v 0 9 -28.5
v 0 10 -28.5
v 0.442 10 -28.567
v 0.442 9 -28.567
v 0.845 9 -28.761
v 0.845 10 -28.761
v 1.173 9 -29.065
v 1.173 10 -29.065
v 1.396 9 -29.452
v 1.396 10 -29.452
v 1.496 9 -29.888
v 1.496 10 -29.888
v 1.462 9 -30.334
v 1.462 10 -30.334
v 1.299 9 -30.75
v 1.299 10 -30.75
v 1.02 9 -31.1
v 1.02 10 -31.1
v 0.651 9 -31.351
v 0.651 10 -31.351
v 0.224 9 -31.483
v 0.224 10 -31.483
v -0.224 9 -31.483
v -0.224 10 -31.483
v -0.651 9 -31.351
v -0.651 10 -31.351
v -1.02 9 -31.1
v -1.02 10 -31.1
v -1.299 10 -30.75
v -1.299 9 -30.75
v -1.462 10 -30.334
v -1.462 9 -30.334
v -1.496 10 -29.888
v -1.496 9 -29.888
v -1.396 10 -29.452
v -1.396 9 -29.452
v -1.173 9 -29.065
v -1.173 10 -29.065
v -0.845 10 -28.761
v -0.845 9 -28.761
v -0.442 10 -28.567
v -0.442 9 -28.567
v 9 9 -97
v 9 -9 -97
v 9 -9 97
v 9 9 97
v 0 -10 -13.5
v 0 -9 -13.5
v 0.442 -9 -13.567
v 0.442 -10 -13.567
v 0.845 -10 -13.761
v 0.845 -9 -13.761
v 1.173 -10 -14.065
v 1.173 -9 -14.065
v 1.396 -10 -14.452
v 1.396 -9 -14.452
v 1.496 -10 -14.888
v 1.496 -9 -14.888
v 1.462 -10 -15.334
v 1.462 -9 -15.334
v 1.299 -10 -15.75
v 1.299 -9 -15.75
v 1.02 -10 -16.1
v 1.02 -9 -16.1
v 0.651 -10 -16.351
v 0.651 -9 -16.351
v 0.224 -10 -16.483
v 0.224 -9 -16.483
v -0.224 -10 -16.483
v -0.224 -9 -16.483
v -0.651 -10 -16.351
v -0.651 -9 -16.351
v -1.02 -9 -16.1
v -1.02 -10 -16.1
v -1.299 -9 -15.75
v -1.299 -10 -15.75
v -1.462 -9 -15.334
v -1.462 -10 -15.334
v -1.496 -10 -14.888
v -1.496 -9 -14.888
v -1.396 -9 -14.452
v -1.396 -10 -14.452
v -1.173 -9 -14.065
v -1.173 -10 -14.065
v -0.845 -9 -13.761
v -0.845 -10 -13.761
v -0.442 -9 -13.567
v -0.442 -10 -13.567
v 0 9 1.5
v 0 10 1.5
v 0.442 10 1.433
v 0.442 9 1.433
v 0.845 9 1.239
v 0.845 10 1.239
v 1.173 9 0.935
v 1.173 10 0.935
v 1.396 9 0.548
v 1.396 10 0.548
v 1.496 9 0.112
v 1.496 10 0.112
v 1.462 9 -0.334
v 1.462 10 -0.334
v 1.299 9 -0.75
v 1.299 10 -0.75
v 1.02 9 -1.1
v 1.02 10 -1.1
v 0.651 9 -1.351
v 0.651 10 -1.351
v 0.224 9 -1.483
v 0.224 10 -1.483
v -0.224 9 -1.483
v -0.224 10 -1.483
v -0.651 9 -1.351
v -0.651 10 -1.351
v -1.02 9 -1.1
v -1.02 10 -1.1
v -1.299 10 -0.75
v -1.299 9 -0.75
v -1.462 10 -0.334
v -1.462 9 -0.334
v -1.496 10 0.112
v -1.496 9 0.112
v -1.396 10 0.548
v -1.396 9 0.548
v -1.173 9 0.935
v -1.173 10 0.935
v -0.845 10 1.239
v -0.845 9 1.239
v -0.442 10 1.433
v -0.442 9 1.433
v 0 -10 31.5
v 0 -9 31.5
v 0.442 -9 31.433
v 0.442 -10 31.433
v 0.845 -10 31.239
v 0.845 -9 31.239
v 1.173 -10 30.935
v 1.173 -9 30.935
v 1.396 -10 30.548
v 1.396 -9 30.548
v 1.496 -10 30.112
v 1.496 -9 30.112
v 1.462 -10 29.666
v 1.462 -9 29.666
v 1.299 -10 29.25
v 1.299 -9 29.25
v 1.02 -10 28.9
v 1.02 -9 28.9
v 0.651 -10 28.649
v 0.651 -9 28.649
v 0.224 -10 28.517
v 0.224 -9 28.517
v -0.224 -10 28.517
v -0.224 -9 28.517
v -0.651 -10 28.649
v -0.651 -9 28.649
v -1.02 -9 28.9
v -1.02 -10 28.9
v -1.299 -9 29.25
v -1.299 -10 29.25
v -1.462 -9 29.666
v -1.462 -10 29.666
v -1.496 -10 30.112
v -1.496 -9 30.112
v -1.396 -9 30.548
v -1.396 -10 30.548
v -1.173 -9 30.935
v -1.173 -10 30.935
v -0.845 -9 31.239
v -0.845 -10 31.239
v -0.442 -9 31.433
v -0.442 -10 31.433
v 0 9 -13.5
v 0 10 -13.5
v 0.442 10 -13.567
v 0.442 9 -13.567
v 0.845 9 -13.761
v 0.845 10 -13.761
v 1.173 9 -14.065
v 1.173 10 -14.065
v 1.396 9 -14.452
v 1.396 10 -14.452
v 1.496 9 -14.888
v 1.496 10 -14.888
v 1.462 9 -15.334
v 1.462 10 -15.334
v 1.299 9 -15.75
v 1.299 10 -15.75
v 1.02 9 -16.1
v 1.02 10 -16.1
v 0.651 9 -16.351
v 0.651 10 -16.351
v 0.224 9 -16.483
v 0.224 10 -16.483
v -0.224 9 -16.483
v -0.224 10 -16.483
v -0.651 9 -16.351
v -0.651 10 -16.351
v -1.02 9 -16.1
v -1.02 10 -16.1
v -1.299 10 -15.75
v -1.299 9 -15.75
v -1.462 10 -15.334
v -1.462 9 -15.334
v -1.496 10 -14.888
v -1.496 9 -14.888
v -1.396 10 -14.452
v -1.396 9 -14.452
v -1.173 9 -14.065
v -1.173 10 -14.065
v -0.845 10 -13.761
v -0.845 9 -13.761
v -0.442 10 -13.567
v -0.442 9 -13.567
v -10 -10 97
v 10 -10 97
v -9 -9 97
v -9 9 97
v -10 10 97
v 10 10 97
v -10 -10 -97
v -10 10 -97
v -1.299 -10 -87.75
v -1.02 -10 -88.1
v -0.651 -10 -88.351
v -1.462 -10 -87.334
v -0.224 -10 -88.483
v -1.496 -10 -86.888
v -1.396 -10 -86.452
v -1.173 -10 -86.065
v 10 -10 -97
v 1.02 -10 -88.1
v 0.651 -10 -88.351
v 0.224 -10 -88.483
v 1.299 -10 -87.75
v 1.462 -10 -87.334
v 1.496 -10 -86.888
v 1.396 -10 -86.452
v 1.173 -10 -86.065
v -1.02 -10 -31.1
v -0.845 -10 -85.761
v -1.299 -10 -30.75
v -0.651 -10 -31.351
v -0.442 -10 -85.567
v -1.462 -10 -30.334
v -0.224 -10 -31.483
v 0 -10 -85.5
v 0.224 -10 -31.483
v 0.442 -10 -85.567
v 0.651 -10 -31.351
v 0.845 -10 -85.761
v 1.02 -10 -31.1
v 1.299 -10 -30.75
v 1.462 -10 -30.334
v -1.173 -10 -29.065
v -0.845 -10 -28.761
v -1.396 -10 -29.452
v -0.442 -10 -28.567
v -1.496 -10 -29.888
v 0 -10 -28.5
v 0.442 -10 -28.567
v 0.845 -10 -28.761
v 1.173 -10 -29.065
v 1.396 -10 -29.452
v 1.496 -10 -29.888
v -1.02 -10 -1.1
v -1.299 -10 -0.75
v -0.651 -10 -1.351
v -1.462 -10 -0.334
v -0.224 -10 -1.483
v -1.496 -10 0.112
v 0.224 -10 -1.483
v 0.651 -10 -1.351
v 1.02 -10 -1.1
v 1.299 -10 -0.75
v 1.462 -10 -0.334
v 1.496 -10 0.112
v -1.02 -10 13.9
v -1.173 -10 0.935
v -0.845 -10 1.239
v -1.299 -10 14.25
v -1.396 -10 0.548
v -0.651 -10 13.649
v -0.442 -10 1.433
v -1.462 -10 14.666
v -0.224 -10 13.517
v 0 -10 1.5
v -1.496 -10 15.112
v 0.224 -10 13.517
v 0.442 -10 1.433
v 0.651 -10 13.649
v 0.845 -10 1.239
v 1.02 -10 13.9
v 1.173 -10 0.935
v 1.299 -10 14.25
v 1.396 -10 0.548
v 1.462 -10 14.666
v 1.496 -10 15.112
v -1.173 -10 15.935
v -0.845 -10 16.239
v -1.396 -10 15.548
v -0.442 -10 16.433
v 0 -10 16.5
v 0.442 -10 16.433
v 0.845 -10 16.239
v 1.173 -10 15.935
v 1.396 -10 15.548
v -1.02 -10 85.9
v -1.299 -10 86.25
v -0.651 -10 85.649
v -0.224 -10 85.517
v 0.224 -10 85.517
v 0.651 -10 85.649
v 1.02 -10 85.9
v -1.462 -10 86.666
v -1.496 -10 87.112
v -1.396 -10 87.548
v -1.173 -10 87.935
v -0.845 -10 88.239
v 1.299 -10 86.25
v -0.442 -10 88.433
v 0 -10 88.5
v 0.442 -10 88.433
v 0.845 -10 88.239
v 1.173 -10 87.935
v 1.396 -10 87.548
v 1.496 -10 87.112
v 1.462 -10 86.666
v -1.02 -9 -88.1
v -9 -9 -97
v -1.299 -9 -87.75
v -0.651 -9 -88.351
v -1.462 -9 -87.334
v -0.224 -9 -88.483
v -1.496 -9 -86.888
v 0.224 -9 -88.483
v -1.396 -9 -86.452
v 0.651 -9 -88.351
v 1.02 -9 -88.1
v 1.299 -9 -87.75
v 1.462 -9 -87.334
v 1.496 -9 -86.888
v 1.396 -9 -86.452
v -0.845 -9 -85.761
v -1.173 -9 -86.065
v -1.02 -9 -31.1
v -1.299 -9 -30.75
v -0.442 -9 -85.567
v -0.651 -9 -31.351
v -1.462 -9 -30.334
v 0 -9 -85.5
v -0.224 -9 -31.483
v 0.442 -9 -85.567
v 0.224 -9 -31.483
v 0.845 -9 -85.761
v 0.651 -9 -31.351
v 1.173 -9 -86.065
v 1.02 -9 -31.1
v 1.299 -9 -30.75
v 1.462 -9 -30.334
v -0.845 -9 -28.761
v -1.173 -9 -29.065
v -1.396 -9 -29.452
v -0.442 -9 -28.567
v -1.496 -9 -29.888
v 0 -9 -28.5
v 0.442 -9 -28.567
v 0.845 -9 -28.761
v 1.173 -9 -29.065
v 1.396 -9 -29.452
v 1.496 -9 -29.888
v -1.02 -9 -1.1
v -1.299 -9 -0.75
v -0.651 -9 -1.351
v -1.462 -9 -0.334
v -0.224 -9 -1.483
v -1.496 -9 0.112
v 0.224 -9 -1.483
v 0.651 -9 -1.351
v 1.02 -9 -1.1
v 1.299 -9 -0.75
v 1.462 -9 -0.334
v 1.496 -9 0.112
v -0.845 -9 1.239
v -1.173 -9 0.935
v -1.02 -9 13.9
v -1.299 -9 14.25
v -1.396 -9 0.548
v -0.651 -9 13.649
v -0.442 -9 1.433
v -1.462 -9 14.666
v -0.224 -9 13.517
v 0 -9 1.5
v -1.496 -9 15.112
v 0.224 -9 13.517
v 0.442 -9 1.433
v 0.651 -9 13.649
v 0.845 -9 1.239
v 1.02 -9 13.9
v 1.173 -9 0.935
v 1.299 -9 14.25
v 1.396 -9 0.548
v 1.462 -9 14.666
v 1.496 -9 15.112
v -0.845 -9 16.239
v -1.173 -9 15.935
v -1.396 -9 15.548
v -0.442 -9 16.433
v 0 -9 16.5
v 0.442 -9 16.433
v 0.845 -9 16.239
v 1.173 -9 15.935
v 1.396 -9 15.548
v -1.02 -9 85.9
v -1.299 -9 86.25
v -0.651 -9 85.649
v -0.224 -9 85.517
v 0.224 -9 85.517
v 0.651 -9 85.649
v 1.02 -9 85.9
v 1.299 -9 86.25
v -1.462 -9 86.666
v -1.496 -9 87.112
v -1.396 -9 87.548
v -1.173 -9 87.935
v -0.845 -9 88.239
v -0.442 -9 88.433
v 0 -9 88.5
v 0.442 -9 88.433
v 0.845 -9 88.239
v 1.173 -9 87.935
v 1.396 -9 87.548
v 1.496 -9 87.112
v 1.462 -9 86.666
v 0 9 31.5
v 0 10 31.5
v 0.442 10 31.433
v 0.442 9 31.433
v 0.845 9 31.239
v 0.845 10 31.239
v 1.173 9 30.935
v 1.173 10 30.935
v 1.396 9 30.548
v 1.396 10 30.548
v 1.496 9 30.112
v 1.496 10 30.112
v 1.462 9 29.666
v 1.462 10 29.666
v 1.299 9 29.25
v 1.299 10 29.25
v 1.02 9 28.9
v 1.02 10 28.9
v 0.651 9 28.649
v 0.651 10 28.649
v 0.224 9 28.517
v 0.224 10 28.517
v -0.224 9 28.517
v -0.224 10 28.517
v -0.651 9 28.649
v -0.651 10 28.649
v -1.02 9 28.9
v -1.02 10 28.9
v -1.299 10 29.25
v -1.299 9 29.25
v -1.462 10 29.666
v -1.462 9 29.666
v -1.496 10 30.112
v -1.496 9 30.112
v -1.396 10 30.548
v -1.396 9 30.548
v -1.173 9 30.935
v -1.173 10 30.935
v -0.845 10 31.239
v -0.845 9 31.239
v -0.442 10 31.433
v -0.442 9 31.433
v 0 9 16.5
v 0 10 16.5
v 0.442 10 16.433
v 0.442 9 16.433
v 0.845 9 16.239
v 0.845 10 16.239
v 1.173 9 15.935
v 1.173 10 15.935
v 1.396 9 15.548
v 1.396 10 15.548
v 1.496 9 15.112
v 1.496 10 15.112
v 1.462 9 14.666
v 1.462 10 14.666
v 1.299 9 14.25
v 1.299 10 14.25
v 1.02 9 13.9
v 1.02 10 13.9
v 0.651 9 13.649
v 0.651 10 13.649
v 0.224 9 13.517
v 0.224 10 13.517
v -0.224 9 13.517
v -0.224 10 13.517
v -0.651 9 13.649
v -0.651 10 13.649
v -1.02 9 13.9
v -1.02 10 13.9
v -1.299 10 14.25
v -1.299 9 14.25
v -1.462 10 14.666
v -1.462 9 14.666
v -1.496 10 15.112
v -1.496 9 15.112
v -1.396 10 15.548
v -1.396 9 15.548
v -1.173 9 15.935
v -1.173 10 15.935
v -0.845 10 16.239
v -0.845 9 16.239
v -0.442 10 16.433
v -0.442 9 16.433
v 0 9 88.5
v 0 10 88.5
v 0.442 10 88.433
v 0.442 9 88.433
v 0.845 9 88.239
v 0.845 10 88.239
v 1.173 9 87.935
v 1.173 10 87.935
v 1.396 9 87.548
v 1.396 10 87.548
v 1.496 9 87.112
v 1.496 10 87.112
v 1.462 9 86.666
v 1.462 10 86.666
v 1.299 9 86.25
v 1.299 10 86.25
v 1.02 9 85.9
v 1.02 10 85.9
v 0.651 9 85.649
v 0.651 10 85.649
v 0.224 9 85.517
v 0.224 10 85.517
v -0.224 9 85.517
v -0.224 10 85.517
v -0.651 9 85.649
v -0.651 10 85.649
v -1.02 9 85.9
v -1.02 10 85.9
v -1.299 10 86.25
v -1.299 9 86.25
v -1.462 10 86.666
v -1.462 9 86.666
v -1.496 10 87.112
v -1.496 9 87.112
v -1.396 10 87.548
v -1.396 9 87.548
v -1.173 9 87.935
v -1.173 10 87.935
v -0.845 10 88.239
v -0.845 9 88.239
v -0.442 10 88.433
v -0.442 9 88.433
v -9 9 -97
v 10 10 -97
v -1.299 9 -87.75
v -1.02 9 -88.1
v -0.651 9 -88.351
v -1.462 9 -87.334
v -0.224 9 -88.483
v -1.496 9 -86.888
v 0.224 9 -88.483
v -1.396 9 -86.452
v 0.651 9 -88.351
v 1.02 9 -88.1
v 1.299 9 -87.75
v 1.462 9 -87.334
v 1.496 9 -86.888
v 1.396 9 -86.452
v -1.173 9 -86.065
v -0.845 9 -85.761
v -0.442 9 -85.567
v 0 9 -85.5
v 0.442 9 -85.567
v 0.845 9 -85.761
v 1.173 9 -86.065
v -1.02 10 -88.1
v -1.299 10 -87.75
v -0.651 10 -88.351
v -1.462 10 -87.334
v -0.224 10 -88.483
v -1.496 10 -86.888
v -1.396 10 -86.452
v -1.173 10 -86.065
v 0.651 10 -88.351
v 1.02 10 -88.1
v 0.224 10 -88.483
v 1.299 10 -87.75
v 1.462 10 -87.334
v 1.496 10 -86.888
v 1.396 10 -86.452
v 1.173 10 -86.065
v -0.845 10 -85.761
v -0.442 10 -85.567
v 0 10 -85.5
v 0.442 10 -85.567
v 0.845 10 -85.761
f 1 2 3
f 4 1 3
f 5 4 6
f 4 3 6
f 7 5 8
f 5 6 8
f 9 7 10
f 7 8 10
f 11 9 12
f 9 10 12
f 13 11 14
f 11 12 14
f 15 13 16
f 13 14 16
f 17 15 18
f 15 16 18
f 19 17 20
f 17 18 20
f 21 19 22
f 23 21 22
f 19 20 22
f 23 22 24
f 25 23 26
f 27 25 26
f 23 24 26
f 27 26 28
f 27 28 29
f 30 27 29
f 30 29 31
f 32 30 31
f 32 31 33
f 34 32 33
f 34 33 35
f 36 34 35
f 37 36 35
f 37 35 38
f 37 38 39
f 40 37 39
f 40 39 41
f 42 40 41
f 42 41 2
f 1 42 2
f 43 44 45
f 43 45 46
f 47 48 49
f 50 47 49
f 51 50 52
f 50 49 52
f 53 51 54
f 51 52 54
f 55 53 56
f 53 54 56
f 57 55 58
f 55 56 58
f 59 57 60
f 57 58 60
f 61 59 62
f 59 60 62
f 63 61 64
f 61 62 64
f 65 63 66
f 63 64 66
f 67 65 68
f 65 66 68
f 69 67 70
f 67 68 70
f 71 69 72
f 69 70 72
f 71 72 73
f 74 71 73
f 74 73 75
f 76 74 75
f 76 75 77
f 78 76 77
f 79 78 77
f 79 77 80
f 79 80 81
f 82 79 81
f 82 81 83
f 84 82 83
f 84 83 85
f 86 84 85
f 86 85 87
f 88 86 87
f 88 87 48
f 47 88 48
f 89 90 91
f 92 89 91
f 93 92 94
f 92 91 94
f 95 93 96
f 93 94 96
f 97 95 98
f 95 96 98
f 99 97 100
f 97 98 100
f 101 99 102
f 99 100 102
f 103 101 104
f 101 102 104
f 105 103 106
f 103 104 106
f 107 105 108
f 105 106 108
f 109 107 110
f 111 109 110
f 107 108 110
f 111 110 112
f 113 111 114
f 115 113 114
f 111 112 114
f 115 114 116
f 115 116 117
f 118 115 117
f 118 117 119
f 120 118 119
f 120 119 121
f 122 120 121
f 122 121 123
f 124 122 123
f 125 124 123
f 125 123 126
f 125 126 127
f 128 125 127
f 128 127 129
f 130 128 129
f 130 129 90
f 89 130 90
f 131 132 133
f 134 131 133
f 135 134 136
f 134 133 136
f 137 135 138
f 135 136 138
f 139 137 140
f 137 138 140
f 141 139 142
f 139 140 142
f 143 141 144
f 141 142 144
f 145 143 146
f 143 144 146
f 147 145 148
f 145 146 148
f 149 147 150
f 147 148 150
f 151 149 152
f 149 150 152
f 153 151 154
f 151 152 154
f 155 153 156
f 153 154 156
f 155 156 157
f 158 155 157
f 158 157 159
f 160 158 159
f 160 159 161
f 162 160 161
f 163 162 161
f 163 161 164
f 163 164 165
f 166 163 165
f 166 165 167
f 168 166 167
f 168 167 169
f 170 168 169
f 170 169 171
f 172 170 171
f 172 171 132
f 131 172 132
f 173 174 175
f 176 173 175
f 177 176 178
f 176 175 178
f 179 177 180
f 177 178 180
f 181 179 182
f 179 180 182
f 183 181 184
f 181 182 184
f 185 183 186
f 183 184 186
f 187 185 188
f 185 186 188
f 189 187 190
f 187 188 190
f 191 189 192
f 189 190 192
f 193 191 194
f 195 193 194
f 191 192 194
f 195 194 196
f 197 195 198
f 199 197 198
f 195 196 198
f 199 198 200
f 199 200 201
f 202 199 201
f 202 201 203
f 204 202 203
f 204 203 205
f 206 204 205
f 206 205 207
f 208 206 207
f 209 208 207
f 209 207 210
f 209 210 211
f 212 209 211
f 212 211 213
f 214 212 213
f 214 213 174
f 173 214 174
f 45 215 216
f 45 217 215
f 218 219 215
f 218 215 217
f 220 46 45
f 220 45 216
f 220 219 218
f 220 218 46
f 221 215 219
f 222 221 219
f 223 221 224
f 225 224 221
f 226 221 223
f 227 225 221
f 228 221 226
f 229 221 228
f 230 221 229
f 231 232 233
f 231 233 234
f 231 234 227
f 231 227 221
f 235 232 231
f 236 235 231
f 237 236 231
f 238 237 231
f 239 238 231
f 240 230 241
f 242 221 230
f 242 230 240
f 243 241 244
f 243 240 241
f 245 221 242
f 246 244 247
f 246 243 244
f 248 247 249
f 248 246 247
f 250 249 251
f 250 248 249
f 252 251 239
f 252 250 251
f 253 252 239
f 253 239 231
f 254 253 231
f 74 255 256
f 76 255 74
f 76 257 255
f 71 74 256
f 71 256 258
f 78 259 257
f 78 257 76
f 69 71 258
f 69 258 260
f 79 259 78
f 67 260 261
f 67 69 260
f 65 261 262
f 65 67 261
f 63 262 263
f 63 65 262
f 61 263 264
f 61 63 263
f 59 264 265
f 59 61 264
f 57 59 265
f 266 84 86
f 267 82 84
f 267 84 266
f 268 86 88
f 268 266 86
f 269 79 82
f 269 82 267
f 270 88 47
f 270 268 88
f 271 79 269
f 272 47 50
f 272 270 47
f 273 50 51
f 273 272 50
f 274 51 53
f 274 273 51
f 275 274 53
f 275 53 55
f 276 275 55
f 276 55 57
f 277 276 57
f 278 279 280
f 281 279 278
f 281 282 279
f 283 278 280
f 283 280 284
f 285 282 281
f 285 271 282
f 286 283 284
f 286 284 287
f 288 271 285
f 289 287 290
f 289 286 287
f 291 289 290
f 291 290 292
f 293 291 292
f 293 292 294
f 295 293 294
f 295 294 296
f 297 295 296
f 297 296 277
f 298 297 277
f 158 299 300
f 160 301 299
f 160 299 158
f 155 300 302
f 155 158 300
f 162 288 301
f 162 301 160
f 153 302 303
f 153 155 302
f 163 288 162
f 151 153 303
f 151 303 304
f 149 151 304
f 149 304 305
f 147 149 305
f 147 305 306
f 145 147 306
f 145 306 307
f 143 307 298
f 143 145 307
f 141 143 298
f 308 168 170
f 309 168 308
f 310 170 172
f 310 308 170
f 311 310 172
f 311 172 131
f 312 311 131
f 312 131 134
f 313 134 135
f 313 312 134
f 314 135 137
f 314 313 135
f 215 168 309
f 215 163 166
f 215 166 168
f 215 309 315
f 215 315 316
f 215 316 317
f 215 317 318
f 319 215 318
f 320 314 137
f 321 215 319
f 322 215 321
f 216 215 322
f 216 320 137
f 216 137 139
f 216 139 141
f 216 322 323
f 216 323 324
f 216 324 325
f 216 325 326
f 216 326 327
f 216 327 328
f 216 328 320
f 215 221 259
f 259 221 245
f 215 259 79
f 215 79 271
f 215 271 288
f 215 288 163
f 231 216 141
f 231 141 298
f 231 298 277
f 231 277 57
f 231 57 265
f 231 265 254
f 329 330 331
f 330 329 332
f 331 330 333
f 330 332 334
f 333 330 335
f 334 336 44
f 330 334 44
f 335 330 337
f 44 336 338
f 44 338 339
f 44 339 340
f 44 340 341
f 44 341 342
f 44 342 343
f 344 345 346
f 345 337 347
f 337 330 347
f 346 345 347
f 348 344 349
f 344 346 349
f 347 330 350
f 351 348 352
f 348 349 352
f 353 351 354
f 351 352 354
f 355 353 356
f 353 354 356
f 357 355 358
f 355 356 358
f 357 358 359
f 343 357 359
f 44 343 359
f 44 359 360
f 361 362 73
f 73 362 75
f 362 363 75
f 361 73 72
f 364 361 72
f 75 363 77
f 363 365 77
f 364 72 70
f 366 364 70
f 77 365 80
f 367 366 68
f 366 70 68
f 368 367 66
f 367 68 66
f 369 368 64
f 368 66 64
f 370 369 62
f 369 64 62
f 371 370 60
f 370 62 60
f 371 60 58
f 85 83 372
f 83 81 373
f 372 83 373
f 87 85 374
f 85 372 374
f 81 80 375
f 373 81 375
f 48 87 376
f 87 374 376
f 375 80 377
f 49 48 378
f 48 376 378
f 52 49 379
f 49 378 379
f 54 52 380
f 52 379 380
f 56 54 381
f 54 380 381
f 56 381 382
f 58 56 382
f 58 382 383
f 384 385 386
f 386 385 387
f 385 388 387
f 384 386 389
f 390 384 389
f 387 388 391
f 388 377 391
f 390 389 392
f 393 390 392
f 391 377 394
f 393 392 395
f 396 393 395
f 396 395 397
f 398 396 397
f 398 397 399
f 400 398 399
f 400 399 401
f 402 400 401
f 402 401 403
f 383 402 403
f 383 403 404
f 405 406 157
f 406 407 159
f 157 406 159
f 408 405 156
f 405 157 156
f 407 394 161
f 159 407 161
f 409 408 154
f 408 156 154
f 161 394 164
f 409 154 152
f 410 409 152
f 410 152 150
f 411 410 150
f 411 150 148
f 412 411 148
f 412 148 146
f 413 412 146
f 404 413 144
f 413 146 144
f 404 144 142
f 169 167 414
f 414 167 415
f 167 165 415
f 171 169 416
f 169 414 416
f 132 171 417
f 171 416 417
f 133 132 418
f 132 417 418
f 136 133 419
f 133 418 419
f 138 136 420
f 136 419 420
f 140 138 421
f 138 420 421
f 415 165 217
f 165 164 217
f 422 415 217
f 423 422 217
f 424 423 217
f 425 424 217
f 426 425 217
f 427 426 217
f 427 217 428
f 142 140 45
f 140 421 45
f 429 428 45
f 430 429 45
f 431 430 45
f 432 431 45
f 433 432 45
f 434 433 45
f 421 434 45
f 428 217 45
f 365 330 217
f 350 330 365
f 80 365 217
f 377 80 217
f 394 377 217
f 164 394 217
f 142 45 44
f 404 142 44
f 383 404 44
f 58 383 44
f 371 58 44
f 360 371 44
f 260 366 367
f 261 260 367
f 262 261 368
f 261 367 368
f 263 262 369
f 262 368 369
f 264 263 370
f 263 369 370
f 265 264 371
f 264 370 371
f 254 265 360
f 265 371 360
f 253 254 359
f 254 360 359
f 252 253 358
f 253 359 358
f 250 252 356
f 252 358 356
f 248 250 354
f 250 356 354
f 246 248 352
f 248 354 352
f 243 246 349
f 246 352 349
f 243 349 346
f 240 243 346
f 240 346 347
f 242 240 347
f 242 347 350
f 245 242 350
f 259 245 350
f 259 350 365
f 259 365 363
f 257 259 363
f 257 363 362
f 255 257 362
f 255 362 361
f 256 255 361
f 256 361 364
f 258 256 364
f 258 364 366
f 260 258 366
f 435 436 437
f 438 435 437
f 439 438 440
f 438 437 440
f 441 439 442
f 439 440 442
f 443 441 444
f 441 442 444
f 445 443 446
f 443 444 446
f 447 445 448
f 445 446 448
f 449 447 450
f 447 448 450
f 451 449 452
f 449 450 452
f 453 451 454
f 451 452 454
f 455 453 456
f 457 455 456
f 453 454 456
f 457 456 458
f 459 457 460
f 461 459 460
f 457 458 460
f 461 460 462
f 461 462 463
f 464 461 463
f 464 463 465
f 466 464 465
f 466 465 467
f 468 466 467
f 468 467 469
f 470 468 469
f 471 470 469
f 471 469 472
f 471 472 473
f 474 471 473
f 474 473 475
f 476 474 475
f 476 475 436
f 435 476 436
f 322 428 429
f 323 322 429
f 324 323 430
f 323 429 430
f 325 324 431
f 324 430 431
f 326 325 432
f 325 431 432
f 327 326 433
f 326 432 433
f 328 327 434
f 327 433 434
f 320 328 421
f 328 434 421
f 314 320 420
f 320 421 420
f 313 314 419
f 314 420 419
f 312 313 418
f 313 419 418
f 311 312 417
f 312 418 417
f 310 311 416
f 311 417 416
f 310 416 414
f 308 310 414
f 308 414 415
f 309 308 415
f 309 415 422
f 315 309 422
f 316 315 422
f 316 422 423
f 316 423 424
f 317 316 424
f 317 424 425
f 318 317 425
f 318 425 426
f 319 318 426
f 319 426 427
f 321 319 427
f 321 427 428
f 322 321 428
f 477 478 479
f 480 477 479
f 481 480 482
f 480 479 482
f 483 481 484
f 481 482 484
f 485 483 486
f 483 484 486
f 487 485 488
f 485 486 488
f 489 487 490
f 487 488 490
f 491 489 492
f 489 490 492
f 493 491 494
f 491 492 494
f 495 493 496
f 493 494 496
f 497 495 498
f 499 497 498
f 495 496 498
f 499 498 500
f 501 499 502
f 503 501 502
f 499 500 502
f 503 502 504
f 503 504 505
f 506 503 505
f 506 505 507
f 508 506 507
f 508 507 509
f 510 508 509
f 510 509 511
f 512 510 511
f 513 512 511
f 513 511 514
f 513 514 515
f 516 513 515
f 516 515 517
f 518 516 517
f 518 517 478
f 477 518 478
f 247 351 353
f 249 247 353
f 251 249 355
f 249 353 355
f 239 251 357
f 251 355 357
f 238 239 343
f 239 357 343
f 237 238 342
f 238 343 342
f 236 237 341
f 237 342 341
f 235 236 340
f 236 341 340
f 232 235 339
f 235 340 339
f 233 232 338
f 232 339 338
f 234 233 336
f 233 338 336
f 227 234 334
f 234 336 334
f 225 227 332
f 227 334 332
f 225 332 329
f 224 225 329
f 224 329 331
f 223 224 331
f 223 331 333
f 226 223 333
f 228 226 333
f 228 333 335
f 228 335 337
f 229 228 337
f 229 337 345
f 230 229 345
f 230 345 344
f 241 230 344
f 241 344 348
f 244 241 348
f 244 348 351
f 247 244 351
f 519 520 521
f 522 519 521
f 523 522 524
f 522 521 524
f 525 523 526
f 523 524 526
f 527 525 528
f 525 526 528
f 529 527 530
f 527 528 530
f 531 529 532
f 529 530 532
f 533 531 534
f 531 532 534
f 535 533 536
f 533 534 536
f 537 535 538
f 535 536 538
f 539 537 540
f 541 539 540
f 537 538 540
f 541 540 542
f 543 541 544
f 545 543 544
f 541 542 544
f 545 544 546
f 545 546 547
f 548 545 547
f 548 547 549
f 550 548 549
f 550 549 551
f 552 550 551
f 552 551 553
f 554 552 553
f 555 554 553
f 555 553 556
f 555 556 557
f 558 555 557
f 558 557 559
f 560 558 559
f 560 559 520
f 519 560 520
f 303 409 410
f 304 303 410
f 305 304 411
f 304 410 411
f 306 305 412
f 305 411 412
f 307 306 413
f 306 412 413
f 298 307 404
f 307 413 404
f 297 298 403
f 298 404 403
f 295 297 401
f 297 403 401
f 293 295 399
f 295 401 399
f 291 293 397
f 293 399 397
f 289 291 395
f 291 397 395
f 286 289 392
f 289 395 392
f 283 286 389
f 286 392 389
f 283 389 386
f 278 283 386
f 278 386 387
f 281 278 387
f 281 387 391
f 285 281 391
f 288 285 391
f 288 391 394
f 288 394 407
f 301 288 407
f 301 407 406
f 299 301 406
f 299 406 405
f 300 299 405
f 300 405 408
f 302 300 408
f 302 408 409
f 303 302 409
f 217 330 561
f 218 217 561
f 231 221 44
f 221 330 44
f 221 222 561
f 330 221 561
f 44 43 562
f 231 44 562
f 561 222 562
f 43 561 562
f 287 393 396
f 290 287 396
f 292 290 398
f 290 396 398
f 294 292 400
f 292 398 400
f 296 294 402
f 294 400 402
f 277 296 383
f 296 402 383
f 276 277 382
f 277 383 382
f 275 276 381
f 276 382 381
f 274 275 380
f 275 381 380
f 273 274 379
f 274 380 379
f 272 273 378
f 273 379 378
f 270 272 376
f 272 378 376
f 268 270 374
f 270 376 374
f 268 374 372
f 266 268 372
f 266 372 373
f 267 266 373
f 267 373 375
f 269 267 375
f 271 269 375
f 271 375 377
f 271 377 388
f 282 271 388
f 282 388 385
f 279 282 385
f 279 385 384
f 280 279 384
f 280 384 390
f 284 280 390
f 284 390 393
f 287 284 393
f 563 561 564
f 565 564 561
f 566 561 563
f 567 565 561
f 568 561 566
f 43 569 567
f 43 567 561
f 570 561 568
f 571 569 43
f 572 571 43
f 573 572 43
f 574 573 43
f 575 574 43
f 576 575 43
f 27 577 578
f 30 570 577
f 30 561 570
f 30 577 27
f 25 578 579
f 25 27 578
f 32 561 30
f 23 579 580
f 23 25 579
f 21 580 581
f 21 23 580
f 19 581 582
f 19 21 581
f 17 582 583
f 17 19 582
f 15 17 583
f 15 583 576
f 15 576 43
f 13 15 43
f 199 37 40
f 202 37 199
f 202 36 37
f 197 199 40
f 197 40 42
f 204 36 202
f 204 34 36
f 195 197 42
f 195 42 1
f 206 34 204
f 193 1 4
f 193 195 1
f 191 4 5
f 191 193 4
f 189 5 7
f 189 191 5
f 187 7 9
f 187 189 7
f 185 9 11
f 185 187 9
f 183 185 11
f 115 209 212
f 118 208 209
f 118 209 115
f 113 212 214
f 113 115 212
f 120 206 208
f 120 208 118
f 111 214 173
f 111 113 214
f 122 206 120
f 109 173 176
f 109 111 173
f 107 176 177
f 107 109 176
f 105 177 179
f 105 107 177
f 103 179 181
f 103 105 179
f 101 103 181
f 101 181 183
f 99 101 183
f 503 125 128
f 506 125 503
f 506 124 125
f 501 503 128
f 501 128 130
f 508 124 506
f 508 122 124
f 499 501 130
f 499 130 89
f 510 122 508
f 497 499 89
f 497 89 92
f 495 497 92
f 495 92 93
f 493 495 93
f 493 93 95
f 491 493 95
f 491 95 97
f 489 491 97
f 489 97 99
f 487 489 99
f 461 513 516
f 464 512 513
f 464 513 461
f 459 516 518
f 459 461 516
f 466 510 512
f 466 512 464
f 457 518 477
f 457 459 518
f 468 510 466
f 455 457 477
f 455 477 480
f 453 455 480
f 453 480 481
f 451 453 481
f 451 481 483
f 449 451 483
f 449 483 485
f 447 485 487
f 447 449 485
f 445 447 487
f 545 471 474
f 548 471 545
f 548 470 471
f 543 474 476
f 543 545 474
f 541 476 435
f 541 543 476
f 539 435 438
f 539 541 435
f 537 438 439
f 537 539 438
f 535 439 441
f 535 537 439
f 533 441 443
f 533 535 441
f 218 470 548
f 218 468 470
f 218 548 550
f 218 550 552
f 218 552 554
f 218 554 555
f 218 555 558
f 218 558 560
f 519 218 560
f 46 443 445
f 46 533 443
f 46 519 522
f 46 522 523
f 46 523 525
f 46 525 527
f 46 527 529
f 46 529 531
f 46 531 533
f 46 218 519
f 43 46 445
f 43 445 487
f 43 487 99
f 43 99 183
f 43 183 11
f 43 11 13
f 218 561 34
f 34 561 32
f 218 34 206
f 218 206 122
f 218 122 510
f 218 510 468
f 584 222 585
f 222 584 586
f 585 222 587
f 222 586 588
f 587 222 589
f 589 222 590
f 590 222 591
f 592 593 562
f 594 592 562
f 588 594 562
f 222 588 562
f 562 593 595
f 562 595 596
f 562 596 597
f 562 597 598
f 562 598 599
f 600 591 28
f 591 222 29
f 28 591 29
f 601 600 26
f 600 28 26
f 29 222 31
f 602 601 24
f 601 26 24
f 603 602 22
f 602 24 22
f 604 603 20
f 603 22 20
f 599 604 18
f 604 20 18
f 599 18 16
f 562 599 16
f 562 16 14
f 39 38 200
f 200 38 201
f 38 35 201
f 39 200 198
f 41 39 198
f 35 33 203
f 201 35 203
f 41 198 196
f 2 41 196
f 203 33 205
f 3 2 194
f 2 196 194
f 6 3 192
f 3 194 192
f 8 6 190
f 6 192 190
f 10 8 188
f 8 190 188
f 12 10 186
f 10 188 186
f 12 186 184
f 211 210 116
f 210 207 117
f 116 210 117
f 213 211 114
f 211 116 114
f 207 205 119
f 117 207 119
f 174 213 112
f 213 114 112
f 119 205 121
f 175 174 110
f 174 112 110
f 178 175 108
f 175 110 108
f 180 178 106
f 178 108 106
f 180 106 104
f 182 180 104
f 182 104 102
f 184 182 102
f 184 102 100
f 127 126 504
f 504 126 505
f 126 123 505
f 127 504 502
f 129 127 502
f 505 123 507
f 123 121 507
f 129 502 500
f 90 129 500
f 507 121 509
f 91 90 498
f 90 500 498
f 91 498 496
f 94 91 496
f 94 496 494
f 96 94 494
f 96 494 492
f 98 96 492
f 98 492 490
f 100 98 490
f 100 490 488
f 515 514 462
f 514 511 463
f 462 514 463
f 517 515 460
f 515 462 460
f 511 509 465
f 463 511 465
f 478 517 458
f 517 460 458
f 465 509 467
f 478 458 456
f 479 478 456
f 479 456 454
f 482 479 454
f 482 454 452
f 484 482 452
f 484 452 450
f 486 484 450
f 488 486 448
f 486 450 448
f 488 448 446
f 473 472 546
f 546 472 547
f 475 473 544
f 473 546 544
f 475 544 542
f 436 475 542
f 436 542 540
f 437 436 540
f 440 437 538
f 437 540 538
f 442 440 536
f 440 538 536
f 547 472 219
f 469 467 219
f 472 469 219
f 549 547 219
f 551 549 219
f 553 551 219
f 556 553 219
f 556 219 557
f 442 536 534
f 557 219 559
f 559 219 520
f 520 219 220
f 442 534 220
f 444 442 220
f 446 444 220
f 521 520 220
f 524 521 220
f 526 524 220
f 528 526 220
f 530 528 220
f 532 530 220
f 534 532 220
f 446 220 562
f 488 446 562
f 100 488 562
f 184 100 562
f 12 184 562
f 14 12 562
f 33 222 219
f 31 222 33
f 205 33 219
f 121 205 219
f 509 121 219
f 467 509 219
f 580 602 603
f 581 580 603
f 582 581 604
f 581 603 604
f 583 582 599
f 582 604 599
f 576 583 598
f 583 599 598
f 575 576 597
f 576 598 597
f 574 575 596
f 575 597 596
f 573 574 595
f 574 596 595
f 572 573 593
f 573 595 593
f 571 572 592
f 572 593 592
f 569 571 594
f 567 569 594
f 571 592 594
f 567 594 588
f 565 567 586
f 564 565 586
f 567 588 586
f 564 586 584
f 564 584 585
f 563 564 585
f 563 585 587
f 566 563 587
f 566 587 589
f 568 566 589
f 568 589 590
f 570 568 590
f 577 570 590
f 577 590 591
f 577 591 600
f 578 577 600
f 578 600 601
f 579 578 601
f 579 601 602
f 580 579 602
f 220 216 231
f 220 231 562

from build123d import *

# Parameters (mm, degrees)
SKETCH_1_W          = 20
SKETCH_1_H          = 20
SKETCH_1_W_2        = 18
SKETCH_1_H_2        = 18
EXTRUDE_1_DEPTH     = 97
SKETCH_2_R          = 1.5
CUT_EXTRUDE_1_DEPTH = 166


with BuildPart() as part:
    # 草图1 → 凸台-拉伸1 (new, symmetric)
    with BuildSketch(Plane.XY):
        Rectangle(SKETCH_1_W, SKETCH_1_H)
        Rectangle(SKETCH_1_W_2, SKETCH_1_H_2, mode=Mode.SUBTRACT)
    extrude(amount=EXTRUDE_1_DEPTH, both=True)

    # 草图2 → 切除-拉伸1 (cut)
    with BuildSketch(Plane(origin=(0, 10, 0), x_dir=(1, 0, 0), z_dir=(0, 1, 0))):
        with Locations(Location((0, 87, 0), (0, 0, 270))):
            Circle(SKETCH_2_R)
        with Locations(Location((0, -87, 0), (0, 0, 270))):
            Circle(SKETCH_2_R)
        with Locations(Location((0, 0, 0), (0, 0, 270))):
            Circle(SKETCH_2_R)
        with Locations(Location((0, 15, 0), (0, 0, 270))):
            Circle(SKETCH_2_R)
        with Locations(Location((0, 30, 0), (0, 0, 270))):
            Circle(SKETCH_2_R)
        with Locations(Location((0, -30, 0), (0, 0, 270))):
            Circle(SKETCH_2_R)
        with Locations(Location((0, -15, 0), (0, 0, 270))):
            Circle(SKETCH_2_R)
    extrude(amount=-CUT_EXTRUDE_1_DEPTH, mode=Mode.SUBTRACT)


solid = part.part
